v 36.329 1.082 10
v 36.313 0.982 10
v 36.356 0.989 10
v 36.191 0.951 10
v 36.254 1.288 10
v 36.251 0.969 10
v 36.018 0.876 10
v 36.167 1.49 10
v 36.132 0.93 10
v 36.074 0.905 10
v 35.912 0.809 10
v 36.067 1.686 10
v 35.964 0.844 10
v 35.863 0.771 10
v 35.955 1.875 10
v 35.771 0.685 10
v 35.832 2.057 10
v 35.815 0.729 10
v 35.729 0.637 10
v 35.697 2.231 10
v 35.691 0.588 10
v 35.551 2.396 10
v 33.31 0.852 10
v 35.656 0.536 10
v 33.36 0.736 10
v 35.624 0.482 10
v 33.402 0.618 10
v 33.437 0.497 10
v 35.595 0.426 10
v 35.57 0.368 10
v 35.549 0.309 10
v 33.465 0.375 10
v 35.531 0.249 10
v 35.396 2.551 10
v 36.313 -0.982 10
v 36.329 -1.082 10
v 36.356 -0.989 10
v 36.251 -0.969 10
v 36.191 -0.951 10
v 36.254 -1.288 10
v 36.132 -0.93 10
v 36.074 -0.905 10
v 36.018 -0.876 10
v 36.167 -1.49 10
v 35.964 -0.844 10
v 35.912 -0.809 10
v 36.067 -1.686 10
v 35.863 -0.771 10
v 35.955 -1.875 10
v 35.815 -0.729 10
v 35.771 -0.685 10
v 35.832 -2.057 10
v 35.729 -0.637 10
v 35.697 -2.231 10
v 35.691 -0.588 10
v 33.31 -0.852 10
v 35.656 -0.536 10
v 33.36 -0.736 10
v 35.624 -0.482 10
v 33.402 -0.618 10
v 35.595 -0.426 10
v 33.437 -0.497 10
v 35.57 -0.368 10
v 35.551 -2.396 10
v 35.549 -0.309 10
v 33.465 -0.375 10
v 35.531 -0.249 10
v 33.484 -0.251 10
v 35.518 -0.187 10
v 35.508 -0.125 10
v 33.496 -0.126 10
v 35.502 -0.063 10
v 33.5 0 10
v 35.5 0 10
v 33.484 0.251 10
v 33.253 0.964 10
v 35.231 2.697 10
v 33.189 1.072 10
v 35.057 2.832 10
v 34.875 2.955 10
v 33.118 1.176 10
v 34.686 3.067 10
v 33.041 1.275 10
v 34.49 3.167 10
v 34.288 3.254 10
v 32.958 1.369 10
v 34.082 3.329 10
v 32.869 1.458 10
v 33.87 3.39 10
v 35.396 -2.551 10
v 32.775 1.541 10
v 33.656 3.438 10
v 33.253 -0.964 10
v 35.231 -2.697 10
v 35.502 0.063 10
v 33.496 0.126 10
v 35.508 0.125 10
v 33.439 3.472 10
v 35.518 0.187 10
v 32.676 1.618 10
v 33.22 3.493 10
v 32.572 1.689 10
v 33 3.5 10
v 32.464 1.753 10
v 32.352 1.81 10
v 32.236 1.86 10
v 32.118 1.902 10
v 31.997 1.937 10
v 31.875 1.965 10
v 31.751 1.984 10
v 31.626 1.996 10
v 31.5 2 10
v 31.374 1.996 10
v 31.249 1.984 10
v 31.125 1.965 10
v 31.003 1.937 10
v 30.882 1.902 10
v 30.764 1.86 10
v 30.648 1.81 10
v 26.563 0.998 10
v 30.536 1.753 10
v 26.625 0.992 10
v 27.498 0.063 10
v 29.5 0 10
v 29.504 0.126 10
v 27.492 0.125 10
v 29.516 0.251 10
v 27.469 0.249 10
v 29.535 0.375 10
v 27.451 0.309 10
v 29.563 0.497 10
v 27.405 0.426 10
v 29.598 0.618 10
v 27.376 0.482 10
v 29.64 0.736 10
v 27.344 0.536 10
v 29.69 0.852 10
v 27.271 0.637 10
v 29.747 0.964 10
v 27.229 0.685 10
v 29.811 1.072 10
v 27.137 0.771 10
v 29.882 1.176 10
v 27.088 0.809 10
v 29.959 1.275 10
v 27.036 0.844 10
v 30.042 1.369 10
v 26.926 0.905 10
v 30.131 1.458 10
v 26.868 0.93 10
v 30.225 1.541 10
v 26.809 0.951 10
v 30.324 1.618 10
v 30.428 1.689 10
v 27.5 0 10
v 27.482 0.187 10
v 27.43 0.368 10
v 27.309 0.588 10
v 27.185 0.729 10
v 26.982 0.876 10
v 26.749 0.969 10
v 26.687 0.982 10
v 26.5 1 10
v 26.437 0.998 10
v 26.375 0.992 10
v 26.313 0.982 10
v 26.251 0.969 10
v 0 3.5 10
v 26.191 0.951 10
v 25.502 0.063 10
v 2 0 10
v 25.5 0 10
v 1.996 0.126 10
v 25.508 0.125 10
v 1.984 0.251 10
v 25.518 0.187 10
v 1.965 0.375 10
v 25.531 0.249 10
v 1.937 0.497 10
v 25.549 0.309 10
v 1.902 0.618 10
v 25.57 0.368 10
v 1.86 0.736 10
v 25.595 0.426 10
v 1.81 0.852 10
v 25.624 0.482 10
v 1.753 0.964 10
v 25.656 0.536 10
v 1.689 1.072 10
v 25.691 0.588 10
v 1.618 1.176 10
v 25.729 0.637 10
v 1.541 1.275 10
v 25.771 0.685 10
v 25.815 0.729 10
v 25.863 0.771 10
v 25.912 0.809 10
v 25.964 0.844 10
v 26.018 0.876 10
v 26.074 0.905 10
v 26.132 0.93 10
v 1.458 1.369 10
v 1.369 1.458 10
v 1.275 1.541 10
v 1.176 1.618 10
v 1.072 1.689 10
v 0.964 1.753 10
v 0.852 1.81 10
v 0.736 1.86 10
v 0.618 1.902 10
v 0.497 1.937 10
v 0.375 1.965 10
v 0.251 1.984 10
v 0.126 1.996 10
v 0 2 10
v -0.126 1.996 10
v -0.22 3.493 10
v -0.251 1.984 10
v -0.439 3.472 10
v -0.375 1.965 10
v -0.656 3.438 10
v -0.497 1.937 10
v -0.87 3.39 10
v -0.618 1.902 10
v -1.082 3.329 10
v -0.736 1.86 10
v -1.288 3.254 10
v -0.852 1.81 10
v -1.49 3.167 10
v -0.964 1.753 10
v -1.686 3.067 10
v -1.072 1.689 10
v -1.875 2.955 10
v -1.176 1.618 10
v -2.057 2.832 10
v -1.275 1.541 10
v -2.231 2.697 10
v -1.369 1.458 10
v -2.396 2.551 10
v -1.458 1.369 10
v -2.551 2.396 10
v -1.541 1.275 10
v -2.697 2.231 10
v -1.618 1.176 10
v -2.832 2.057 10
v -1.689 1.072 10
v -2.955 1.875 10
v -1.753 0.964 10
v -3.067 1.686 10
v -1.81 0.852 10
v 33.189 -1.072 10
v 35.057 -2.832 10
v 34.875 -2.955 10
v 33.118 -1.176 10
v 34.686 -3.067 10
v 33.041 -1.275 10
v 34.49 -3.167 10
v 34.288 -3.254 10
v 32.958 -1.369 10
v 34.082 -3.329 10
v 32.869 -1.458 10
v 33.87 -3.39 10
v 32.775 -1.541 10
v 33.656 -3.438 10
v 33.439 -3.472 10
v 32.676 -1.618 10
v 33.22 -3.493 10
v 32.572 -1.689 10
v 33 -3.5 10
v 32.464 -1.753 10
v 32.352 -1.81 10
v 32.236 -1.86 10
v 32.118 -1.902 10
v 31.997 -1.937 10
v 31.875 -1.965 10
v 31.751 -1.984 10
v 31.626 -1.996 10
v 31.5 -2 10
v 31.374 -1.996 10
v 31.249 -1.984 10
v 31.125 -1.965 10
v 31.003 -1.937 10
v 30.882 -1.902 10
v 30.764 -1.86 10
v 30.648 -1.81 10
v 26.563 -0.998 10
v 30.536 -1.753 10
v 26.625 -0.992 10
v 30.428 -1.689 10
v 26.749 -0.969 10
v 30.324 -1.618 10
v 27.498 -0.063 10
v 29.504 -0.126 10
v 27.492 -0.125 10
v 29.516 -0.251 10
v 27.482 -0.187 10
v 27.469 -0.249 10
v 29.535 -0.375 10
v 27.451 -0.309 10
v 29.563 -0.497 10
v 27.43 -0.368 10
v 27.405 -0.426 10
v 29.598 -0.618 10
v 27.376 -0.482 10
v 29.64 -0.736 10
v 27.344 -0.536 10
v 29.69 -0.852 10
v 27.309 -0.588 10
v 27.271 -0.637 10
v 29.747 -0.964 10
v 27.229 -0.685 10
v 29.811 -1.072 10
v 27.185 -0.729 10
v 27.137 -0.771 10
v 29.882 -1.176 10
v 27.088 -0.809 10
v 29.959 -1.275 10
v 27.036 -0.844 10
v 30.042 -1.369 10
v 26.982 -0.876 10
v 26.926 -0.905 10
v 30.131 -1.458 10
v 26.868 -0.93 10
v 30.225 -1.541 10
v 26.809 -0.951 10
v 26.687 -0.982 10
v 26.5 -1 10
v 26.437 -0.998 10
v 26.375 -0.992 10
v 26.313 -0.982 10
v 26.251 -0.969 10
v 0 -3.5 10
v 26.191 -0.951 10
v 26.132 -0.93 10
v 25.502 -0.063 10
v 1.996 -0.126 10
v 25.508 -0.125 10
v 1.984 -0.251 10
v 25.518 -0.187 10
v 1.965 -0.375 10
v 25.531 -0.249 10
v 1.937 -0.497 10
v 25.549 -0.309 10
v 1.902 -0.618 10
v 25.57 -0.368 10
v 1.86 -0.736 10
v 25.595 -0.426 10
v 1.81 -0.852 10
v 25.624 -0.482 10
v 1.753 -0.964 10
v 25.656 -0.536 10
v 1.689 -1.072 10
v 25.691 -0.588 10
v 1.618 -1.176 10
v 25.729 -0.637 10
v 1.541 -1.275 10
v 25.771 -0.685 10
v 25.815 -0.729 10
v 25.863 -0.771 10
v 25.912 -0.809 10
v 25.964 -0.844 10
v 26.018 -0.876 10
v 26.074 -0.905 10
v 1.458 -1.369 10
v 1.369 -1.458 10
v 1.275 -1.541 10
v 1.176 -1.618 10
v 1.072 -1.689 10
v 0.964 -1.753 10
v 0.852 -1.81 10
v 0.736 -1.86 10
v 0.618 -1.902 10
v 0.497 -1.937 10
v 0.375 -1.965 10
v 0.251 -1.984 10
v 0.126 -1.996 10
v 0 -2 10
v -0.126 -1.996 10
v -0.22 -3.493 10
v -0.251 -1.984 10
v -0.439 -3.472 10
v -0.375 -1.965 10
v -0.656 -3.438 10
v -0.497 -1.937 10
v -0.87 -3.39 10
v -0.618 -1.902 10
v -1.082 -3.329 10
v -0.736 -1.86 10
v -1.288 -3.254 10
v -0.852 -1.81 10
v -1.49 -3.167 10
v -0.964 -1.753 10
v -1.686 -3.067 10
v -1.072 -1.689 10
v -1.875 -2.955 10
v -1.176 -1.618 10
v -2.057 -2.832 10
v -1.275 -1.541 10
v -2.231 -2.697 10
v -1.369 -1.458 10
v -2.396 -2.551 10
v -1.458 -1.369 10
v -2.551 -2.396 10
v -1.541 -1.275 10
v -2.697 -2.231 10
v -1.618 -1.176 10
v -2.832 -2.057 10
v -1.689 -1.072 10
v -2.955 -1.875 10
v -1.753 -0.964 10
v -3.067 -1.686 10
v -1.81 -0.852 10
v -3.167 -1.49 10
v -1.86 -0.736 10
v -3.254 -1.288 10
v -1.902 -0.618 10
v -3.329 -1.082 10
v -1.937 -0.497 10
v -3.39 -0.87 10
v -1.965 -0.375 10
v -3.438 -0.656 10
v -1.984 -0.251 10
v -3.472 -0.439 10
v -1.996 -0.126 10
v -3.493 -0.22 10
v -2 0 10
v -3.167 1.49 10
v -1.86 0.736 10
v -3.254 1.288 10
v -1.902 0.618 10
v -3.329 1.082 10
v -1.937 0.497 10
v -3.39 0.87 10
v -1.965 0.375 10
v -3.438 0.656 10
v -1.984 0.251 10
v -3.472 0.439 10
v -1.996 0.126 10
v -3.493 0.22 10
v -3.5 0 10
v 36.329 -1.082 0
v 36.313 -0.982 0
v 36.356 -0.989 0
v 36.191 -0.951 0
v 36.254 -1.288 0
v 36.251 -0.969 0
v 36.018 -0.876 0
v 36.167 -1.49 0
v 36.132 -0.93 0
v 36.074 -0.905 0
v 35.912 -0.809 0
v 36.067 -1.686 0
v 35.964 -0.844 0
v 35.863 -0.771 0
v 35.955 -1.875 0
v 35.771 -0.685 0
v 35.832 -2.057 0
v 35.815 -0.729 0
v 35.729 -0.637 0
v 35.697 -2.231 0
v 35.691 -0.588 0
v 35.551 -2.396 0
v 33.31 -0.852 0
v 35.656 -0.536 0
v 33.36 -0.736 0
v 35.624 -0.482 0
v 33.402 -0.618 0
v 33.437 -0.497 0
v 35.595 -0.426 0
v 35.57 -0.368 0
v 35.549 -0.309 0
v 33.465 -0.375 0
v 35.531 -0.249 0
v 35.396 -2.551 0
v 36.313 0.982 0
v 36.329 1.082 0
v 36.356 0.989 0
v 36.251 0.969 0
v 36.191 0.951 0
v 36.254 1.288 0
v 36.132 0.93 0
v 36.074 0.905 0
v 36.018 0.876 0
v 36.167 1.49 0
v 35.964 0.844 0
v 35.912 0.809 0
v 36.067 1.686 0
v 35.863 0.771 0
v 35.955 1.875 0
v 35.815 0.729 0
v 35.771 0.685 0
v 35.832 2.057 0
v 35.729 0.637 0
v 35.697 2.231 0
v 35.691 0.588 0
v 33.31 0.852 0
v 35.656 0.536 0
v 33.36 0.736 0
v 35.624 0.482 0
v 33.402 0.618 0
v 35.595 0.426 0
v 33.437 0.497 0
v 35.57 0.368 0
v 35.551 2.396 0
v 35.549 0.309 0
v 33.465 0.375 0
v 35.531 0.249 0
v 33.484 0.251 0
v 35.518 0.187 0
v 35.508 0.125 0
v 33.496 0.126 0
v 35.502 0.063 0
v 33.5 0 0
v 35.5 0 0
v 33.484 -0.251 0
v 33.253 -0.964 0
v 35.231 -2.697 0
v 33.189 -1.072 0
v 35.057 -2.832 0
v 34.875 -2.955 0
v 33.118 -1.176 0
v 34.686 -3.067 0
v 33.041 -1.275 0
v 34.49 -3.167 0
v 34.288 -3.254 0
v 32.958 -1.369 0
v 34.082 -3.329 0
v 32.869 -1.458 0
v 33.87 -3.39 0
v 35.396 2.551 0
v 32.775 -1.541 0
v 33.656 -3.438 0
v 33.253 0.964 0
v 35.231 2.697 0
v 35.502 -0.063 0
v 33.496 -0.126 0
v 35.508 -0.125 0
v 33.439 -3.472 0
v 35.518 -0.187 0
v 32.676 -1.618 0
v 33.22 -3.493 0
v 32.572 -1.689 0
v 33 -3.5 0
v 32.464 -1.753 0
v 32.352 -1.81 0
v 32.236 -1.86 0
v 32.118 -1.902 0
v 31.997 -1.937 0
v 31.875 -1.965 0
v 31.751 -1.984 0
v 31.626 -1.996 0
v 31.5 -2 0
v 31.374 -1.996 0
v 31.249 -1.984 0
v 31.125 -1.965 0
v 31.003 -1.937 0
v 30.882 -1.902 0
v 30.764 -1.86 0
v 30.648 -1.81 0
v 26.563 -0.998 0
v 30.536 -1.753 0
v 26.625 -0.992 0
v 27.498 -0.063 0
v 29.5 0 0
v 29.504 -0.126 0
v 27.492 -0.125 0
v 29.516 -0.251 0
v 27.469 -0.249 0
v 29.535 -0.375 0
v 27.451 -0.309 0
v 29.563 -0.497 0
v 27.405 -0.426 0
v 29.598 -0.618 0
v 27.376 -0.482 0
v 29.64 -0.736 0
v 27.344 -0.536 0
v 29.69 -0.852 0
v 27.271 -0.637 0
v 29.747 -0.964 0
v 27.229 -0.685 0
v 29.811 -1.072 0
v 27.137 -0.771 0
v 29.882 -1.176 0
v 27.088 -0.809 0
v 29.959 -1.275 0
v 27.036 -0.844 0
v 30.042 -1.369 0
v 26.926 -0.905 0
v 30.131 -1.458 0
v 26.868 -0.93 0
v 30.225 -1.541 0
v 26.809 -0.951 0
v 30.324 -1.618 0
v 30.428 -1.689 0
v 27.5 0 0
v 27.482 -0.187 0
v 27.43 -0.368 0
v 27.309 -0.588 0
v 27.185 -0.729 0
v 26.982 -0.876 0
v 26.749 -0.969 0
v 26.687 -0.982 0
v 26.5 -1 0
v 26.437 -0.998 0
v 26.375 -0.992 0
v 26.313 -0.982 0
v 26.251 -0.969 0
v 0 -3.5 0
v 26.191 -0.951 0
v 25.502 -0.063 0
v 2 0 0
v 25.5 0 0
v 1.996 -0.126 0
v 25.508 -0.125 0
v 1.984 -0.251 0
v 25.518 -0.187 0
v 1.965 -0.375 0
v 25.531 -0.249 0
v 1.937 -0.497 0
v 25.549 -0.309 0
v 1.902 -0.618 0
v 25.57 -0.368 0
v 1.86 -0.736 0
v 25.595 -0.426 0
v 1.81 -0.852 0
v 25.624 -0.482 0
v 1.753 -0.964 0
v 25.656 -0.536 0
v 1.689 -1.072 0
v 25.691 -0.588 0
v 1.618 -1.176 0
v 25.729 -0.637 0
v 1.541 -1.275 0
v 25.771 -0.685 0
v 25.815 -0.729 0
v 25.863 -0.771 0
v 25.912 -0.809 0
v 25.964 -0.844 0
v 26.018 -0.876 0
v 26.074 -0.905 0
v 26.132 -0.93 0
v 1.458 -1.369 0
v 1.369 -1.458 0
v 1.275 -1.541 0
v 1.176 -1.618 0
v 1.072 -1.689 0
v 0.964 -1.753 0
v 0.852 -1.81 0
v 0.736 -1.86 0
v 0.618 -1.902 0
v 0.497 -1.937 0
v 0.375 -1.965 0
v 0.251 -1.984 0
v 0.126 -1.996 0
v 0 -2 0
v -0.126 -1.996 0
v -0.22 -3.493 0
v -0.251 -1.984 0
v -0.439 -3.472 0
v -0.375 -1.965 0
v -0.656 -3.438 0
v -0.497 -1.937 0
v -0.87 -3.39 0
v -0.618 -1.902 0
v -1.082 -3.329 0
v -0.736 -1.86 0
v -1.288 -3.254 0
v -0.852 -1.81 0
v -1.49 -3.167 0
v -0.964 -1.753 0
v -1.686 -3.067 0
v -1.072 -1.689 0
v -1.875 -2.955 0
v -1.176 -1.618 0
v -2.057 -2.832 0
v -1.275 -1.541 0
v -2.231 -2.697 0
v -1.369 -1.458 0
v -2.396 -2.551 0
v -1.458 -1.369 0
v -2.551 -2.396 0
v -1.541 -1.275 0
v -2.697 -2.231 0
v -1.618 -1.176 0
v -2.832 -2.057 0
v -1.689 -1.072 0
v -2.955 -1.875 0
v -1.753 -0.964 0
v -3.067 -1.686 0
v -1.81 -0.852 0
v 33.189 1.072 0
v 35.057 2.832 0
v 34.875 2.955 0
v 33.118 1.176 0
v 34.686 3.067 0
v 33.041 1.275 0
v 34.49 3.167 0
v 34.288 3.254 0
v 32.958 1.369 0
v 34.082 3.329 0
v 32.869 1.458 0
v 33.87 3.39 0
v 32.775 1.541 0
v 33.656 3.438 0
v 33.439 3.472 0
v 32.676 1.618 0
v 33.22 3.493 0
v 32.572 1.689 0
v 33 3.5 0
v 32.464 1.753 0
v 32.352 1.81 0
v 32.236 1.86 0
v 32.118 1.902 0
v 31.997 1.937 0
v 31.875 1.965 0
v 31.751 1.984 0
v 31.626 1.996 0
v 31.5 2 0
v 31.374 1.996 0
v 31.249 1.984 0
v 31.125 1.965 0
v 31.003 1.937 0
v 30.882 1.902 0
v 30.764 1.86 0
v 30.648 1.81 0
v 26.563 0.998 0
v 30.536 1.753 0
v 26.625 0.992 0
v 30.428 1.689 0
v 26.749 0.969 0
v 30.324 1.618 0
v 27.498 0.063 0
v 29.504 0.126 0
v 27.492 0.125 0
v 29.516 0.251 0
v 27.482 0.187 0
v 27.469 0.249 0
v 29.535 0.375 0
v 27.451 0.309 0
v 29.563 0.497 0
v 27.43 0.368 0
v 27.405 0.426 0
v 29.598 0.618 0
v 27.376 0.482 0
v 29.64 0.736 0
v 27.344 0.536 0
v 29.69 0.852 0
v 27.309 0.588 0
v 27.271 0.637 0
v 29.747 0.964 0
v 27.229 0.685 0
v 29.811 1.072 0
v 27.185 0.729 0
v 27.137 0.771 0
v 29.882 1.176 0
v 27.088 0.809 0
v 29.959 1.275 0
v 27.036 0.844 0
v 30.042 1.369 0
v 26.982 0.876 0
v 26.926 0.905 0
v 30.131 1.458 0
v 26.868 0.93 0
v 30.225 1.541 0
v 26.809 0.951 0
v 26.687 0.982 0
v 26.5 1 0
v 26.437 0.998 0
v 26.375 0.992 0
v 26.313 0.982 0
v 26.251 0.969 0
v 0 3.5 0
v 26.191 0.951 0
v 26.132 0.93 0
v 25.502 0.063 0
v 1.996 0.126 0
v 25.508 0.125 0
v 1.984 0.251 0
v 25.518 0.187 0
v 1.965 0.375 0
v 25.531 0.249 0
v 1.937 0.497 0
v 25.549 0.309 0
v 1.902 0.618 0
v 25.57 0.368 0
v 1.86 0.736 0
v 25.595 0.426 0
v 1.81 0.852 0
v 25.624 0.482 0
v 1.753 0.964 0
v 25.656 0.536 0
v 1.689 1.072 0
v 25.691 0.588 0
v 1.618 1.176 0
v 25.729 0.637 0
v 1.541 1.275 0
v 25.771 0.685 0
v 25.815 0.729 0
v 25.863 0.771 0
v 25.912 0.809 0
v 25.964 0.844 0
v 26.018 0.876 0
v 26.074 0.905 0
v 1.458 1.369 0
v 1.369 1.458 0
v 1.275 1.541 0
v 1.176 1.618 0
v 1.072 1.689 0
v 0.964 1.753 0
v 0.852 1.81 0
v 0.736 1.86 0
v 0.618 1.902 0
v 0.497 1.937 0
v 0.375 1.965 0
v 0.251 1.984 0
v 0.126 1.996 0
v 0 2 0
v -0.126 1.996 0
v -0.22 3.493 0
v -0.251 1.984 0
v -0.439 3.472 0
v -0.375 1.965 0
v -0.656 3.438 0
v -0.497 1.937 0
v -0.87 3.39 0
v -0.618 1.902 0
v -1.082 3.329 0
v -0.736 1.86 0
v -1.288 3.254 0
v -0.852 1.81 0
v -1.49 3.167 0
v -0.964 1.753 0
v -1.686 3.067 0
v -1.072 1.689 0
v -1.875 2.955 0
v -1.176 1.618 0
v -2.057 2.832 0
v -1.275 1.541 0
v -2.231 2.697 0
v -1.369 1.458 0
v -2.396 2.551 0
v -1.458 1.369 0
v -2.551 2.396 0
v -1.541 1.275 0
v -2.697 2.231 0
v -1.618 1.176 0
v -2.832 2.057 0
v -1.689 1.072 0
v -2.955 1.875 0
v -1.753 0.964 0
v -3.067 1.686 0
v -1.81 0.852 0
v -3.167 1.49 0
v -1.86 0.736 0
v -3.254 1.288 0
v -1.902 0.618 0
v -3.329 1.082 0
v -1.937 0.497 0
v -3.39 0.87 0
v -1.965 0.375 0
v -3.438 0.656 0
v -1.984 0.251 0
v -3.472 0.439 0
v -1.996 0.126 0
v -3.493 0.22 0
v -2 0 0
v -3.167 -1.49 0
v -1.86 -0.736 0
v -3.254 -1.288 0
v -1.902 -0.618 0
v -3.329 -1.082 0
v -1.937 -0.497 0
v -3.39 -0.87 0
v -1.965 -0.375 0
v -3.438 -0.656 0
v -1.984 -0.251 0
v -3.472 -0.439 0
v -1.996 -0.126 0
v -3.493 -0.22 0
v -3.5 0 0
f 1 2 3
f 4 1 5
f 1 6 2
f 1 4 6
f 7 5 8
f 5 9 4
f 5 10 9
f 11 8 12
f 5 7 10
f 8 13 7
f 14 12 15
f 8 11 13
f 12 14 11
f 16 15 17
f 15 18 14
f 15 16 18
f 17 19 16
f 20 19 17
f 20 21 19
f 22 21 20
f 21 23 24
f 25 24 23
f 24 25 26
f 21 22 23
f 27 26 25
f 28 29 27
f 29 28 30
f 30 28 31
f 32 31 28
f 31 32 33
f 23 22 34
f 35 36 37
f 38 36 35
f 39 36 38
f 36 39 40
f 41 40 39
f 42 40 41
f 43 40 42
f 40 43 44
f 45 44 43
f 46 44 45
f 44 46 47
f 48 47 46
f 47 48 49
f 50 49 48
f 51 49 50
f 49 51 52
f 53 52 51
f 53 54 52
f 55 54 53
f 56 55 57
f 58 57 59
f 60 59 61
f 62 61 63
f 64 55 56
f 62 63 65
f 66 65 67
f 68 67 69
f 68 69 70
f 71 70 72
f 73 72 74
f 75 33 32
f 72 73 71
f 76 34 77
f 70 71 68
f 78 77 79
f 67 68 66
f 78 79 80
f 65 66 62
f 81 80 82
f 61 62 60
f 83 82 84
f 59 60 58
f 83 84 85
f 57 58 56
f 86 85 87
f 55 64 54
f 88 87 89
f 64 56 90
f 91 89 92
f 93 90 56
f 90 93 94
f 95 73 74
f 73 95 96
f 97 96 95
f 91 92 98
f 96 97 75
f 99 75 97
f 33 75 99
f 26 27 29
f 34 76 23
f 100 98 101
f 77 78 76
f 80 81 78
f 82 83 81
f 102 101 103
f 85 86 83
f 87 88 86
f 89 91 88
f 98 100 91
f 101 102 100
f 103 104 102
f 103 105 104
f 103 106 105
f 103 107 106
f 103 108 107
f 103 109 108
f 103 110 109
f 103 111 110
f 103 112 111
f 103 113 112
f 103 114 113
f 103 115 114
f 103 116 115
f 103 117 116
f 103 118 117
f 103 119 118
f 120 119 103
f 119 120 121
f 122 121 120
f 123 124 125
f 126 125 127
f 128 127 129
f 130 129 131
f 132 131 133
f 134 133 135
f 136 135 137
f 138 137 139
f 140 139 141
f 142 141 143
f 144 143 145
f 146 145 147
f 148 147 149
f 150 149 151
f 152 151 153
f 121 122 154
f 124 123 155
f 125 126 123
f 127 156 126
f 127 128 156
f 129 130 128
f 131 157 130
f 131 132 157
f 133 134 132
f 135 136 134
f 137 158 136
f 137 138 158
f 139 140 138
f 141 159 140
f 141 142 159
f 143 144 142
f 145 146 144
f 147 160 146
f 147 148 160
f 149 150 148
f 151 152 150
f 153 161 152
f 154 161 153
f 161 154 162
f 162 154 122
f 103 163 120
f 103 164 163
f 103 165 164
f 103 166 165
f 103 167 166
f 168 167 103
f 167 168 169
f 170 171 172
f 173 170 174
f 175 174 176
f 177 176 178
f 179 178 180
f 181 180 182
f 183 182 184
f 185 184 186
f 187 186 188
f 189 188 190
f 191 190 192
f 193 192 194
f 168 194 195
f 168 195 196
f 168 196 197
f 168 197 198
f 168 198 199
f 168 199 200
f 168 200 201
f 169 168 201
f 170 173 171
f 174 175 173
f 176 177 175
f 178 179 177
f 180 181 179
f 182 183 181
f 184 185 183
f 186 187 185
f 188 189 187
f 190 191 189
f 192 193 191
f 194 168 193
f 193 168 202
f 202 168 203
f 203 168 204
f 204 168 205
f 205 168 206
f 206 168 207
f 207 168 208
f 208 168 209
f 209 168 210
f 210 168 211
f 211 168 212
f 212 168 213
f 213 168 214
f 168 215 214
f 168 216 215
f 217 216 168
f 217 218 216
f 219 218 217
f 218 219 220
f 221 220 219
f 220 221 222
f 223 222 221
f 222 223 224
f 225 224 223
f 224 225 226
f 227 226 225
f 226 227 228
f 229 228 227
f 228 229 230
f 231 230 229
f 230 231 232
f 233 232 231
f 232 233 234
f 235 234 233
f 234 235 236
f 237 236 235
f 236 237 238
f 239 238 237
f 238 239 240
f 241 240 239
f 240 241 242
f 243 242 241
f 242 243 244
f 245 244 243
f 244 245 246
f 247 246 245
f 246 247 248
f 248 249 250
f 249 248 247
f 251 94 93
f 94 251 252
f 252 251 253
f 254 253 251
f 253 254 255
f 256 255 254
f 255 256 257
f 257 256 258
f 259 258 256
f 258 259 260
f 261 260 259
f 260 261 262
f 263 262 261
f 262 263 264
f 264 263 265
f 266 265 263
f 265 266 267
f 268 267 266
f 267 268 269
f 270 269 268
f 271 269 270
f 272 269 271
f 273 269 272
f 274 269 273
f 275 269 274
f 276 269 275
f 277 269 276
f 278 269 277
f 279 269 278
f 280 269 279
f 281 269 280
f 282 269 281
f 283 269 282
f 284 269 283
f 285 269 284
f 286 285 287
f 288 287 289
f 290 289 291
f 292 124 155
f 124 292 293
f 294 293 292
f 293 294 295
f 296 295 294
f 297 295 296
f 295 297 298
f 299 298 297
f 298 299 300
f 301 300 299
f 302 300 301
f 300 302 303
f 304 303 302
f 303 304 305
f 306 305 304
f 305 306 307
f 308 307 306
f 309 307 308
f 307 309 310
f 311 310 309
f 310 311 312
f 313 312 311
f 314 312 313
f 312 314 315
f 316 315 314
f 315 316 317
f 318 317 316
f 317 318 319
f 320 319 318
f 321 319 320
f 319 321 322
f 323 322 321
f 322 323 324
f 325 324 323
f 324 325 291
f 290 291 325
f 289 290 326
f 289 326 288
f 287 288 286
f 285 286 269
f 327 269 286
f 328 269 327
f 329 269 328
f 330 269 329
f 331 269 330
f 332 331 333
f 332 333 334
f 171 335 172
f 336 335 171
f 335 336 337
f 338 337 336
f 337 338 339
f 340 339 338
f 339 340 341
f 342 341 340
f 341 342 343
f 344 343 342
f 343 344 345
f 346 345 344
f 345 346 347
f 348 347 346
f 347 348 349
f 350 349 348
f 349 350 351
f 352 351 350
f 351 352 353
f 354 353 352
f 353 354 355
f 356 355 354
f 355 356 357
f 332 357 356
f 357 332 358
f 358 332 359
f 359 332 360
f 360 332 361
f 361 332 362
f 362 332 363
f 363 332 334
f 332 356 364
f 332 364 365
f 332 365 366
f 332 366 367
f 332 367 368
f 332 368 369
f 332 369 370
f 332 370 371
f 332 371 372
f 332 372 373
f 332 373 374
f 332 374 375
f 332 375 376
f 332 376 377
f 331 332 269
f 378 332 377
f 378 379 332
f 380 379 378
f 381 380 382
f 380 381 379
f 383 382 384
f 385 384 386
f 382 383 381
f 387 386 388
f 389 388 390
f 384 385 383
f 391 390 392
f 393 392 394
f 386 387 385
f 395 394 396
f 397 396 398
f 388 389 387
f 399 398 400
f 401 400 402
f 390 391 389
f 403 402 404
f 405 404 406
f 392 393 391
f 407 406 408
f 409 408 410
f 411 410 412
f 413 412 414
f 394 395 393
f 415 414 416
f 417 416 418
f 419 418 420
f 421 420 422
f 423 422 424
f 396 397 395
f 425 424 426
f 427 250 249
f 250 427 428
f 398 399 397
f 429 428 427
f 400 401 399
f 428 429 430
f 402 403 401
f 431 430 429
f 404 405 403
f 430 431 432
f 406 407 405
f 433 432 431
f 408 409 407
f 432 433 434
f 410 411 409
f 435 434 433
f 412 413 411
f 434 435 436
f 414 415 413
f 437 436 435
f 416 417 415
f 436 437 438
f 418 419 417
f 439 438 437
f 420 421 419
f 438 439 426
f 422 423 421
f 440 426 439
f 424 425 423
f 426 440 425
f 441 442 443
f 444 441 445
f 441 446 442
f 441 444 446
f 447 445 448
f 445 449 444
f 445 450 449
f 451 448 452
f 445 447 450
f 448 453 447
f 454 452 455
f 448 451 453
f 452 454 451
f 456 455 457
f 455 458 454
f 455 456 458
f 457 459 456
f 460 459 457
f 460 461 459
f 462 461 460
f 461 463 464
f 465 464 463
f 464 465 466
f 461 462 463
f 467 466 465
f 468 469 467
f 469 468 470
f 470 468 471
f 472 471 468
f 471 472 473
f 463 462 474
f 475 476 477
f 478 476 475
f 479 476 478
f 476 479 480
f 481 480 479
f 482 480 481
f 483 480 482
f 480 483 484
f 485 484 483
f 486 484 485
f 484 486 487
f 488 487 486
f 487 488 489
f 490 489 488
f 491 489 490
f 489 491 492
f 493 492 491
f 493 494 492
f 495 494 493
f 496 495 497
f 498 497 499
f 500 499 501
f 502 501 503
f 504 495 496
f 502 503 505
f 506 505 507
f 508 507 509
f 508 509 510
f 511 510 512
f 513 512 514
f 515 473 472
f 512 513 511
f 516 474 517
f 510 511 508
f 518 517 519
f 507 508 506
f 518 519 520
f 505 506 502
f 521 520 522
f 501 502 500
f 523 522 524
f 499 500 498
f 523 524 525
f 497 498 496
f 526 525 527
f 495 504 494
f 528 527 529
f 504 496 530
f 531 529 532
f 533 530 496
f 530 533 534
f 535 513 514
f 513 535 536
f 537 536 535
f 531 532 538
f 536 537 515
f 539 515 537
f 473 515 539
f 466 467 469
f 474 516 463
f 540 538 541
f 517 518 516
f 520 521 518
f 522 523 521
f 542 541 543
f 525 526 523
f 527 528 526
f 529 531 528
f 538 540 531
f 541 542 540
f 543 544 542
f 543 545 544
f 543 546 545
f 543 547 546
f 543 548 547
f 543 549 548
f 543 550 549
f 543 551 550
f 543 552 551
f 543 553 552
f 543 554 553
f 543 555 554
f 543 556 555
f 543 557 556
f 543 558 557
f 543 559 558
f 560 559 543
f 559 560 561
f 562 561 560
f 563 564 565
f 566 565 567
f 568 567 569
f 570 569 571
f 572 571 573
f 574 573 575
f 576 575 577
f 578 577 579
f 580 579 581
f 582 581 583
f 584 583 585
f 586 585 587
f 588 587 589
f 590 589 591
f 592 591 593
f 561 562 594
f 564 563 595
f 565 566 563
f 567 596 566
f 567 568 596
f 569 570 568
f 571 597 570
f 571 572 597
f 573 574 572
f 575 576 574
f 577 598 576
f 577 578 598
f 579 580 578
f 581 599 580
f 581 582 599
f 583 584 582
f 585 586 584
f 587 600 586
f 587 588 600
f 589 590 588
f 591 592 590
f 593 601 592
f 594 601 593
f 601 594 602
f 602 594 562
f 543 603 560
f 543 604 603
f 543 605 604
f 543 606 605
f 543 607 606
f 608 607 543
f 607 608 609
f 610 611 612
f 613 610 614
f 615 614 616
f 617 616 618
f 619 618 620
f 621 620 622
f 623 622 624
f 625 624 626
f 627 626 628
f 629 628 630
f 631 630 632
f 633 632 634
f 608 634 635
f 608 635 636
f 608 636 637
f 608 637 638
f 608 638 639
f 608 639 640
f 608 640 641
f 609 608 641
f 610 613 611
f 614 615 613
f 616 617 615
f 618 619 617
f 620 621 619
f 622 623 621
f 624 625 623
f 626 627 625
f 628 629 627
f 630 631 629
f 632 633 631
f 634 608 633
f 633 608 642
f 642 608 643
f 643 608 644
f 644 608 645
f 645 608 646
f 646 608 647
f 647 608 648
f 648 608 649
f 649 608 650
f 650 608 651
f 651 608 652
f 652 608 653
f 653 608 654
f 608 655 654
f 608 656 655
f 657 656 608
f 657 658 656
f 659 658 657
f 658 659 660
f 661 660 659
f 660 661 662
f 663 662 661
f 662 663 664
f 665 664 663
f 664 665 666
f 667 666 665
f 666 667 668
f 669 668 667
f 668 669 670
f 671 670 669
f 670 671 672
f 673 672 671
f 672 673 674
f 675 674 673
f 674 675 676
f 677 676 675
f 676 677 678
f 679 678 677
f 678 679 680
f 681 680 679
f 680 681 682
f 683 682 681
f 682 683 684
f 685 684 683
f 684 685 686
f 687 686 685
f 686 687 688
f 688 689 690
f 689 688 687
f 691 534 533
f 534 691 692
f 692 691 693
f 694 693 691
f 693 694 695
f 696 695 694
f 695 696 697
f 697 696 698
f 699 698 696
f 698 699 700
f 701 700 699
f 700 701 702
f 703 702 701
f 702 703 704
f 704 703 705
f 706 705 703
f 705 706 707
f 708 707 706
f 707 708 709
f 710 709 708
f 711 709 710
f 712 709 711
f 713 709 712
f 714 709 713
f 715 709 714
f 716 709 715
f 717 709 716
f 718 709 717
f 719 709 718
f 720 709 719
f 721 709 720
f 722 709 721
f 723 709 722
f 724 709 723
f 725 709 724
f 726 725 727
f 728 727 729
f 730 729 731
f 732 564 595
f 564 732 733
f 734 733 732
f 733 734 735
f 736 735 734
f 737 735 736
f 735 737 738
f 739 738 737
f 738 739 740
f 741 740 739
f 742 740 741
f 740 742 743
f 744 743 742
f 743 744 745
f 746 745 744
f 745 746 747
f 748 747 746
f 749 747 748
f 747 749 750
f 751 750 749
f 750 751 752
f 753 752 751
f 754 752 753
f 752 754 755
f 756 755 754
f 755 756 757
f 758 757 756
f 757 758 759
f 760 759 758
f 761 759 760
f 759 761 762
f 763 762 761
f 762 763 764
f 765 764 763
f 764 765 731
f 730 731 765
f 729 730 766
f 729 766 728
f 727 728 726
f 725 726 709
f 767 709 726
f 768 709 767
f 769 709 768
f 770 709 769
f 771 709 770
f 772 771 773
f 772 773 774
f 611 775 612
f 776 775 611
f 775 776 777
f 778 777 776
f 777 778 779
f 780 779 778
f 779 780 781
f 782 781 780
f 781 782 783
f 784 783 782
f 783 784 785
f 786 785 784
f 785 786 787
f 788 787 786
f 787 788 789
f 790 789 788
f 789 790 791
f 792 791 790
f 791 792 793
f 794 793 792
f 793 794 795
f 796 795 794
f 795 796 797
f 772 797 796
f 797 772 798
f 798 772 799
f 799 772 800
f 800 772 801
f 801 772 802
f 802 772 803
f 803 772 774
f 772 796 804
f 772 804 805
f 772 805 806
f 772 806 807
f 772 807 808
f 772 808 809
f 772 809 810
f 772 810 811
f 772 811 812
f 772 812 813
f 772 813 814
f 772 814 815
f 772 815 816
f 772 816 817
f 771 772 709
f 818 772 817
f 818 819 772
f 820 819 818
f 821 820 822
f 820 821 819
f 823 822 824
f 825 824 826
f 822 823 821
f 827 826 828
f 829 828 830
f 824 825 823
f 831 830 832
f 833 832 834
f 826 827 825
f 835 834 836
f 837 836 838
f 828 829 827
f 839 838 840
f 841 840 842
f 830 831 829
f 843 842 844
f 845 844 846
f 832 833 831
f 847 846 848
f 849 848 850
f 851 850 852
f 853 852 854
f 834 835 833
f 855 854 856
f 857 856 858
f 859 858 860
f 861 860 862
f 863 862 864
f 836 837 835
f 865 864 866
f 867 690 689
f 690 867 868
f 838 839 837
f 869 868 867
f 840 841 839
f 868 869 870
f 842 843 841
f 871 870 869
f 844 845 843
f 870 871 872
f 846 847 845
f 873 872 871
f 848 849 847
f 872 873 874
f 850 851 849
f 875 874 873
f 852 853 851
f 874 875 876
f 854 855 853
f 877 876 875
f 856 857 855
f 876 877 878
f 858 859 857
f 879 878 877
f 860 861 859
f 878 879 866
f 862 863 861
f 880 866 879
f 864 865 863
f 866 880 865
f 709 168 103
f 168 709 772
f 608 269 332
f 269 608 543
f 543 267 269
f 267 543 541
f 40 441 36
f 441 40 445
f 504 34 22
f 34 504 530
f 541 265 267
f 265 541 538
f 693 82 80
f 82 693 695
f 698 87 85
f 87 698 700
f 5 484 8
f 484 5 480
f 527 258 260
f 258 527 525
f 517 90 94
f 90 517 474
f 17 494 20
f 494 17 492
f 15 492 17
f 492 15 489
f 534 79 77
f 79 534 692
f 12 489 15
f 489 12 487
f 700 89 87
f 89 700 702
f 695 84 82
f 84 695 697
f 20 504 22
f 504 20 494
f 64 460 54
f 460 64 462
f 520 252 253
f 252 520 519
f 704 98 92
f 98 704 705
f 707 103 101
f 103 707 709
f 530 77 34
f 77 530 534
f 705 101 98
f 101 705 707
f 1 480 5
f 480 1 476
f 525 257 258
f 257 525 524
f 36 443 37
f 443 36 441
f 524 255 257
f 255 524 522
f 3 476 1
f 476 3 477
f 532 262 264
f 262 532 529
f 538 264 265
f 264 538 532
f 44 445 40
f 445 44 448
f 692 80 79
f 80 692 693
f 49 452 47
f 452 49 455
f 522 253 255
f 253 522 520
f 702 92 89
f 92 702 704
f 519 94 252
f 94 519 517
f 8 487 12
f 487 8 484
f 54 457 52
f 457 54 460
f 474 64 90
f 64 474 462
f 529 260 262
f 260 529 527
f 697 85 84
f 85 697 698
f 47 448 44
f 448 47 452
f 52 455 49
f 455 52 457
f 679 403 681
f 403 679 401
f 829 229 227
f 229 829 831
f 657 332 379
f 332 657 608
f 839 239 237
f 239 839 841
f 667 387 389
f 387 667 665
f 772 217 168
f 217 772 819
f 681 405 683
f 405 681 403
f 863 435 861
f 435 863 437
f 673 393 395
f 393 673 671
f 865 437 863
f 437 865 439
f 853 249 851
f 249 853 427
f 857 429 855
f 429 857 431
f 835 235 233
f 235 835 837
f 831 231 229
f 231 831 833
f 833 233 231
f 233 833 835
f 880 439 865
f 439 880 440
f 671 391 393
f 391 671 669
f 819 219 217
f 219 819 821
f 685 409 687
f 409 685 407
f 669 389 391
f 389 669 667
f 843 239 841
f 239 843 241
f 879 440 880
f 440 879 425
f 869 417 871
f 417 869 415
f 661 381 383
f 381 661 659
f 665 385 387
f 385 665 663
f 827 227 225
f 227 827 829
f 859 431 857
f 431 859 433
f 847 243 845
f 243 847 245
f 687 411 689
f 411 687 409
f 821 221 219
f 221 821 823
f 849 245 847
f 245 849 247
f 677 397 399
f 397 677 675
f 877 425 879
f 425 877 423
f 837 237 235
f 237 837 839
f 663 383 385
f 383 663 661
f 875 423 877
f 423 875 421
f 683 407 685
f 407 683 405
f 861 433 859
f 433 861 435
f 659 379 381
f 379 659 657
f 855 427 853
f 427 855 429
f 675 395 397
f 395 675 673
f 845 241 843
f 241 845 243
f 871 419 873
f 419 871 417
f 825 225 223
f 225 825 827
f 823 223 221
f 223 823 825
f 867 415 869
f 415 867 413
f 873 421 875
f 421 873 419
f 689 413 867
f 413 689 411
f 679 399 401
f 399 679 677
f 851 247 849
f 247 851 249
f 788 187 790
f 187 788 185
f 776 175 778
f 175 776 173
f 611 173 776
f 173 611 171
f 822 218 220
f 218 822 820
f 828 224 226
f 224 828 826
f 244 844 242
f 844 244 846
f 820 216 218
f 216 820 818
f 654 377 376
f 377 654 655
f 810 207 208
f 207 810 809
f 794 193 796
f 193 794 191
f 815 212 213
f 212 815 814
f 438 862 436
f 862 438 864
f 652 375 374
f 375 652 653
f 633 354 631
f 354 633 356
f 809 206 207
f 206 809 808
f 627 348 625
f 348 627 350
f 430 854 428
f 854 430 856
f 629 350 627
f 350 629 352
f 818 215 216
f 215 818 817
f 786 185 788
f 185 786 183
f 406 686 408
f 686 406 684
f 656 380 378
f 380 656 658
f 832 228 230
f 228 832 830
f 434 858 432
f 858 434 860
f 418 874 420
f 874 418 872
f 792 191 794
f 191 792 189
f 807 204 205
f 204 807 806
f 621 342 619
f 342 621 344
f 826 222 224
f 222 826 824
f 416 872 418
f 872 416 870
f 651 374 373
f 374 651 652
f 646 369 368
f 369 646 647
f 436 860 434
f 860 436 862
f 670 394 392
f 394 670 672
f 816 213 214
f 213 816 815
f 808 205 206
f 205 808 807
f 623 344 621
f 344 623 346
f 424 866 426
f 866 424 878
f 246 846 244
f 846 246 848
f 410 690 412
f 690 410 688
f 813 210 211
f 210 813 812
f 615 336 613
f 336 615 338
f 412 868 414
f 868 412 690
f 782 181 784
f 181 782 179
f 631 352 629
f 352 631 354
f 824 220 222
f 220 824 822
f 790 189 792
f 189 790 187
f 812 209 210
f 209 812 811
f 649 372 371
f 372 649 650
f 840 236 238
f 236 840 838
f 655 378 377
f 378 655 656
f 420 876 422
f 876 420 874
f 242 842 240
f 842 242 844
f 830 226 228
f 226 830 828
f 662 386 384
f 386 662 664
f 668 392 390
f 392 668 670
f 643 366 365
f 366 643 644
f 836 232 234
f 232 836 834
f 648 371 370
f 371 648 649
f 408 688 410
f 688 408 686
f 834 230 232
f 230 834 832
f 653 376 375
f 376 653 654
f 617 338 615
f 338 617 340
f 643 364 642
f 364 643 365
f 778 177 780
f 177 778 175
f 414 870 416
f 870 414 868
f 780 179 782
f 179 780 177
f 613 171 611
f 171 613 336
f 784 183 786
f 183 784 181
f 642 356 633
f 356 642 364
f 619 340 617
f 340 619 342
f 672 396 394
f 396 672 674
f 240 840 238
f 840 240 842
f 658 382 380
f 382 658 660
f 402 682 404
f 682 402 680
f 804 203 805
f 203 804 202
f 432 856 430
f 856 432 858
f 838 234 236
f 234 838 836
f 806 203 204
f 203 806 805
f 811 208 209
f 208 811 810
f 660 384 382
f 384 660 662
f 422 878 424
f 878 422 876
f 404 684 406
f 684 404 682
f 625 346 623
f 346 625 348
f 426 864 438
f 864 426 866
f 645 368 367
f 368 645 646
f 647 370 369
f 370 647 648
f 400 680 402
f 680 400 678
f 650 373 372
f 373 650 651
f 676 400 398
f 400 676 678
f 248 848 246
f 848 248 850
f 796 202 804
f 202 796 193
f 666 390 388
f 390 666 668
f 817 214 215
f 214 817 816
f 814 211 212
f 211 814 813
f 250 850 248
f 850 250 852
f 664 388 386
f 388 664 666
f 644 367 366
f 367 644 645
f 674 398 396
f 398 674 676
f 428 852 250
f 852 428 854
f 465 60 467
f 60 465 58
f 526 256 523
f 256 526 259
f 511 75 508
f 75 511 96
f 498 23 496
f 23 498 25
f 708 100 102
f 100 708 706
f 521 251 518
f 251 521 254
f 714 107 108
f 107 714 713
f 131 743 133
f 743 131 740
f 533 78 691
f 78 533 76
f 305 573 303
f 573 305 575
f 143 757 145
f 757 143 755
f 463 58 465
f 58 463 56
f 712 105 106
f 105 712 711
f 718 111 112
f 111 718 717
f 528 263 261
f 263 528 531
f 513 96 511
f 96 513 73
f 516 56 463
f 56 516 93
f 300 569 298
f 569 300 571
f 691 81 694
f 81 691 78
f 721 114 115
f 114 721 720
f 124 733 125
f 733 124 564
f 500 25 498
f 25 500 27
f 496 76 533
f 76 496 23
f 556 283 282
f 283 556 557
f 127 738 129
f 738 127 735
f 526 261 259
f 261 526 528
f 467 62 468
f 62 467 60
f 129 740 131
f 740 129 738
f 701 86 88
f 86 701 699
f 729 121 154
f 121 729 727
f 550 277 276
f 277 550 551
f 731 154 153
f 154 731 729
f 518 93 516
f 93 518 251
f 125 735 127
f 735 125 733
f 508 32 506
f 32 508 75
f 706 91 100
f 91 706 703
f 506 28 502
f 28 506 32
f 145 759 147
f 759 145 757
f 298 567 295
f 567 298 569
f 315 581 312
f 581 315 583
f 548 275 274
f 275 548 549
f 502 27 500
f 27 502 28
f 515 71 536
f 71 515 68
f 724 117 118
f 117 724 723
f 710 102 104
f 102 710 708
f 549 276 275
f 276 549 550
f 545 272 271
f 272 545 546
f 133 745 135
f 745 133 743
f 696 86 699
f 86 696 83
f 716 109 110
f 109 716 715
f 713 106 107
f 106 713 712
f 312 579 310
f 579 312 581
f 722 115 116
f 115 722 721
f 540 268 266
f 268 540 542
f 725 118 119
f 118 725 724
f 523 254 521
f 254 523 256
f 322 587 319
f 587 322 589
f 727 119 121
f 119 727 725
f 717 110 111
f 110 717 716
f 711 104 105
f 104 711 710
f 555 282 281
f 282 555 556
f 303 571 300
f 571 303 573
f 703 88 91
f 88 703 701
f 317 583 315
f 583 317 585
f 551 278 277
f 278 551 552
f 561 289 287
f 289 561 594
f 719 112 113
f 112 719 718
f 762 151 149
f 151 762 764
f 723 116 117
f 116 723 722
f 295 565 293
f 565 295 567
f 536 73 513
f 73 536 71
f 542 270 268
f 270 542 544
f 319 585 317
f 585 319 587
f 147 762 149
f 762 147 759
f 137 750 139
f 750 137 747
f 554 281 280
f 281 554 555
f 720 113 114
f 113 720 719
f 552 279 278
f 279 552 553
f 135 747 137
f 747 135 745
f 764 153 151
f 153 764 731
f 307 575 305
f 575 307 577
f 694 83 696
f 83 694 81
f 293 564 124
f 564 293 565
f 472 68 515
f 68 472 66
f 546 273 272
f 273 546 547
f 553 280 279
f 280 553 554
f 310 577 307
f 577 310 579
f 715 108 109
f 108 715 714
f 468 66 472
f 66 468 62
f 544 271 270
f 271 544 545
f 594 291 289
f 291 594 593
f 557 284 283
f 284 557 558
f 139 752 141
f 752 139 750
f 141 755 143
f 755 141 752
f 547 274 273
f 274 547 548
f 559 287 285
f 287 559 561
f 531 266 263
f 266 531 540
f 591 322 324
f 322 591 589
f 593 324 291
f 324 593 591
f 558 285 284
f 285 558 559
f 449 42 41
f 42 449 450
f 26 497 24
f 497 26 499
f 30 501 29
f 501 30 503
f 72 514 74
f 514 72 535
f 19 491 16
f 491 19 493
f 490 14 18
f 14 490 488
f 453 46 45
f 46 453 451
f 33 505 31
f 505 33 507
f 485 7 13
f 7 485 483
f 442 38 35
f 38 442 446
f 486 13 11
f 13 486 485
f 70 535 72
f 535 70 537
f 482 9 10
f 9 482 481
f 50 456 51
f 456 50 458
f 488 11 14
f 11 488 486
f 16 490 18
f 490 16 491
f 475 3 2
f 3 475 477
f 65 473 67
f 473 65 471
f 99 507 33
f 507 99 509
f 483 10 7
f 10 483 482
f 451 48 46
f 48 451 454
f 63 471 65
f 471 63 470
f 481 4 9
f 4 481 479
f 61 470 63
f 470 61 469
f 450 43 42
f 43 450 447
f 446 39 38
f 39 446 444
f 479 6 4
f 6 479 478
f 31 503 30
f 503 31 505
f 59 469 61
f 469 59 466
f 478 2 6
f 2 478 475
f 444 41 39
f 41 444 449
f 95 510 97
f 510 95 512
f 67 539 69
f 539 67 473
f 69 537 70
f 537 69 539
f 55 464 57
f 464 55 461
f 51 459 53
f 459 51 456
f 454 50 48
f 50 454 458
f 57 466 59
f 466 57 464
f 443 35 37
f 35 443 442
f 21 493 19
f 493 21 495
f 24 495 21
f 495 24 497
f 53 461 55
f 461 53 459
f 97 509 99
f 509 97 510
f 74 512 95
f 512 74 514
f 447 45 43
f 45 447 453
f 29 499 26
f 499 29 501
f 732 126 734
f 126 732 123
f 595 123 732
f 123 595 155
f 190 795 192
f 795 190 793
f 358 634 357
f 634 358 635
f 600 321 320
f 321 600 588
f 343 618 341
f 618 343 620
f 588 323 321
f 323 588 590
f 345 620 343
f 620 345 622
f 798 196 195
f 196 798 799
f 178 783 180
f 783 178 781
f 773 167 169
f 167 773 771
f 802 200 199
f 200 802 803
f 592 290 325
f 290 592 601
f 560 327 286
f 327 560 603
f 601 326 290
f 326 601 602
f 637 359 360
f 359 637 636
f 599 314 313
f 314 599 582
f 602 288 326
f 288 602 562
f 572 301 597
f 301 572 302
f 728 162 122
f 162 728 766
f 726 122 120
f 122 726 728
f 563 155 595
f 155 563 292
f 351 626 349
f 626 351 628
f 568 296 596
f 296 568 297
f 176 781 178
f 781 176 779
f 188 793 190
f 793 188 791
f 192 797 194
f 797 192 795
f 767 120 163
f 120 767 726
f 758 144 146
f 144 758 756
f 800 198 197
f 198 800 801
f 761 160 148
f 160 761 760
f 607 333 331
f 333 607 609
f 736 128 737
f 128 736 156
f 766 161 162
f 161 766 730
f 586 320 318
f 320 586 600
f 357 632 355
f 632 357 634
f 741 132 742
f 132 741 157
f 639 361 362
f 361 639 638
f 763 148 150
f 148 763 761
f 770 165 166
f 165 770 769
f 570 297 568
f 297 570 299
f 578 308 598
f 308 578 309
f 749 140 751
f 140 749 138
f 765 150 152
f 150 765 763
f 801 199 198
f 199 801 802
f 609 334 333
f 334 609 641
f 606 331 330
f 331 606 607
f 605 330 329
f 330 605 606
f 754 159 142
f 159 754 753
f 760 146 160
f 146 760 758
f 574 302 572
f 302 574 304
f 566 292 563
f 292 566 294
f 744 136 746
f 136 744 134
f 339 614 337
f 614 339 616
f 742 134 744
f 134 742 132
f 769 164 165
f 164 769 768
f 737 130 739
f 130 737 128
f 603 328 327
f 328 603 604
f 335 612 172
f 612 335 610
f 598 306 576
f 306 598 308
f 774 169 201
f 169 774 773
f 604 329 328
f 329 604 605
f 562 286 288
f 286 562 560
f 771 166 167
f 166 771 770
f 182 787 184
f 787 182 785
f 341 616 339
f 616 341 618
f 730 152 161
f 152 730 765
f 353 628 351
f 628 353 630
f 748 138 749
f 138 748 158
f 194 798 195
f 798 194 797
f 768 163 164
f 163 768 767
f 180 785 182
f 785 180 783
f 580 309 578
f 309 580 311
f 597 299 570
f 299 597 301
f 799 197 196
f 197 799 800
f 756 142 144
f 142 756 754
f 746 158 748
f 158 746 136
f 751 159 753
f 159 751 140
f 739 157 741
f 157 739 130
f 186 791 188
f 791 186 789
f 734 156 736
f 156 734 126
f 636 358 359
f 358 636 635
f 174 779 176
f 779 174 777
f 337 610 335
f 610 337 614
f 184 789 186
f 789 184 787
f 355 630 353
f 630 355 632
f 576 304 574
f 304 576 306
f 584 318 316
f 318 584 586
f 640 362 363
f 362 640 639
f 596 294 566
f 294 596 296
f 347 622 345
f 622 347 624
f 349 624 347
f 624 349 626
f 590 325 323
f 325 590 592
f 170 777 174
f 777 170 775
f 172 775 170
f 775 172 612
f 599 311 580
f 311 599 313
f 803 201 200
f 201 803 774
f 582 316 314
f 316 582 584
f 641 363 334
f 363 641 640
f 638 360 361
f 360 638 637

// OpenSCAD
$fn=100;

diametre=80;
epaisseur=4;
hauteur=10;
dia_ext=10;
dia_trou=5.5;
dia_trou_vis=5;
//bras porte
longueur_bras=30;
largeur_bras=7;
long_trou_bras=4;
larg_trou_bras=4;
angle_bras=-0;
//bras servo
longueur_bras_servo=40;
largeur_bras_servo=7;
long_trou_bras_servo=4;
larg_trou_bras_servo=4;
dia_vis=2;
dia_milieu=4;
pos_milieu=35;
ecart_vis=10;

module ele_bras(long,larg,haut)
{
	translate([0,-larg/2,0])
		cube([long-larg,larg,haut]);
	translate([long-larg,0,0])
		cylinder(d=larg,h=haut);
		cylinder(d=larg,h=haut);
}

module bras()
{
	difference()
	{
		ele_bras(longueur_bras,largeur_bras,hauteur);
		translate([0,0,-0.1]) ele_bras(long_trou_bras,larg_trou_bras,hauteur+0.2);
	}
}

module extrusion_bras()
{
	translate([0,0,hauteur/2])
		cube([longueur_bras-epaisseur_bras,epaisseur_bras,hauteur],center=true);
	translate([(longueur_bras-epaisseur_bras)/2,0,0])
		cylinder(d=epaisseur_bras,h=hauteur);
	translate([-(longueur_bras-epaisseur_bras)/2,0,0])
		cylinder(d=epaisseur_bras,h=hauteur);
}

module attache()
{
	difference()
	{
		cylinder(d=diametre+epaisseur*2,h=hauteur);
		translate([0,0,-0.1]) cylinder(d=diametre,h=hauteur+0.2);
		translate([-45,-90,-0.1]) cube([90,90,hauteur+0.2]);
		translate([-90,-0.1,-0.1]) cube([90,90,hauteur+0.2]);
		rotate([0,0,-20]) translate([-90,0,-0.1]) cube([90,90,hauteur+0.2]);
		for (i=[1,2])
		{
			rotate([0,0,i*70/3])
				translate([diametre/2-0.5,0,hauteur/2])
					rotate([0,90,0])
						cylinder(d=dia_trou_vis,h=epaisseur+1);
		}
	}
}

module renfort()
{
	difference()
	{	
		cube([10,10,hauteur]);
		translate([10,10,-0.1])
			cylinder(d=15,h=hauteur+0.2);
	}
}

module rotate_bras(angle)
{
	translate([longueur_bras-2*larg_trou_bras,0,0])
		rotate(angle,v=[0,0,1])
			translate([-longueur_bras+2*larg_trou_bras,0,0])
				child();
}

module partie_porte()
{
	difference()
	{
		union()
		{
			attache();
			translate([longueur_bras-largeur_bras/2+diametre/2,0,0])
				rotate([0,0,180])
					rotate_bras(angle_bras)
						bras();
			//translate([diametre/2,1,0])
				//renfort();

			translate([diametre/2+dia_ext/2,0,0]) cylinder(d=dia_ext,h=hauteur);
		}
		translate([diametre/2+dia_ext/2,0,-0.1]) cylinder(d=dia_trou,h=hauteur+0.2);
}
}

module trous_servo()
{
	translate([0,0,-0.1]) cylinder(d=dia_milieu,h=hauteur+0.2);
	translate([ecart_vis/2,0,-0.1]) cylinder(d=dia_vis,h=hauteur+0.2);
	translate([-ecart_vis/2,0,-0.1]) cylinder(d=dia_vis,h=hauteur+0.2);	
}

module partie_servo()
{
 	difference()
	{
		ele_bras(longueur_bras_servo,largeur_bras_servo,hauteur);
		translate([0,0,-0.1]) ele_bras(long_trou_bras_servo,larg_trou_bras_servo,hauteur+0.2);
		translate([pos_milieu-largeur_bras_servo/2,0,0])
			trous_servo();
	}
}

//rotate([0,0,0]) translate([-45,0,0])
//	partie_porte();
partie_servo();
